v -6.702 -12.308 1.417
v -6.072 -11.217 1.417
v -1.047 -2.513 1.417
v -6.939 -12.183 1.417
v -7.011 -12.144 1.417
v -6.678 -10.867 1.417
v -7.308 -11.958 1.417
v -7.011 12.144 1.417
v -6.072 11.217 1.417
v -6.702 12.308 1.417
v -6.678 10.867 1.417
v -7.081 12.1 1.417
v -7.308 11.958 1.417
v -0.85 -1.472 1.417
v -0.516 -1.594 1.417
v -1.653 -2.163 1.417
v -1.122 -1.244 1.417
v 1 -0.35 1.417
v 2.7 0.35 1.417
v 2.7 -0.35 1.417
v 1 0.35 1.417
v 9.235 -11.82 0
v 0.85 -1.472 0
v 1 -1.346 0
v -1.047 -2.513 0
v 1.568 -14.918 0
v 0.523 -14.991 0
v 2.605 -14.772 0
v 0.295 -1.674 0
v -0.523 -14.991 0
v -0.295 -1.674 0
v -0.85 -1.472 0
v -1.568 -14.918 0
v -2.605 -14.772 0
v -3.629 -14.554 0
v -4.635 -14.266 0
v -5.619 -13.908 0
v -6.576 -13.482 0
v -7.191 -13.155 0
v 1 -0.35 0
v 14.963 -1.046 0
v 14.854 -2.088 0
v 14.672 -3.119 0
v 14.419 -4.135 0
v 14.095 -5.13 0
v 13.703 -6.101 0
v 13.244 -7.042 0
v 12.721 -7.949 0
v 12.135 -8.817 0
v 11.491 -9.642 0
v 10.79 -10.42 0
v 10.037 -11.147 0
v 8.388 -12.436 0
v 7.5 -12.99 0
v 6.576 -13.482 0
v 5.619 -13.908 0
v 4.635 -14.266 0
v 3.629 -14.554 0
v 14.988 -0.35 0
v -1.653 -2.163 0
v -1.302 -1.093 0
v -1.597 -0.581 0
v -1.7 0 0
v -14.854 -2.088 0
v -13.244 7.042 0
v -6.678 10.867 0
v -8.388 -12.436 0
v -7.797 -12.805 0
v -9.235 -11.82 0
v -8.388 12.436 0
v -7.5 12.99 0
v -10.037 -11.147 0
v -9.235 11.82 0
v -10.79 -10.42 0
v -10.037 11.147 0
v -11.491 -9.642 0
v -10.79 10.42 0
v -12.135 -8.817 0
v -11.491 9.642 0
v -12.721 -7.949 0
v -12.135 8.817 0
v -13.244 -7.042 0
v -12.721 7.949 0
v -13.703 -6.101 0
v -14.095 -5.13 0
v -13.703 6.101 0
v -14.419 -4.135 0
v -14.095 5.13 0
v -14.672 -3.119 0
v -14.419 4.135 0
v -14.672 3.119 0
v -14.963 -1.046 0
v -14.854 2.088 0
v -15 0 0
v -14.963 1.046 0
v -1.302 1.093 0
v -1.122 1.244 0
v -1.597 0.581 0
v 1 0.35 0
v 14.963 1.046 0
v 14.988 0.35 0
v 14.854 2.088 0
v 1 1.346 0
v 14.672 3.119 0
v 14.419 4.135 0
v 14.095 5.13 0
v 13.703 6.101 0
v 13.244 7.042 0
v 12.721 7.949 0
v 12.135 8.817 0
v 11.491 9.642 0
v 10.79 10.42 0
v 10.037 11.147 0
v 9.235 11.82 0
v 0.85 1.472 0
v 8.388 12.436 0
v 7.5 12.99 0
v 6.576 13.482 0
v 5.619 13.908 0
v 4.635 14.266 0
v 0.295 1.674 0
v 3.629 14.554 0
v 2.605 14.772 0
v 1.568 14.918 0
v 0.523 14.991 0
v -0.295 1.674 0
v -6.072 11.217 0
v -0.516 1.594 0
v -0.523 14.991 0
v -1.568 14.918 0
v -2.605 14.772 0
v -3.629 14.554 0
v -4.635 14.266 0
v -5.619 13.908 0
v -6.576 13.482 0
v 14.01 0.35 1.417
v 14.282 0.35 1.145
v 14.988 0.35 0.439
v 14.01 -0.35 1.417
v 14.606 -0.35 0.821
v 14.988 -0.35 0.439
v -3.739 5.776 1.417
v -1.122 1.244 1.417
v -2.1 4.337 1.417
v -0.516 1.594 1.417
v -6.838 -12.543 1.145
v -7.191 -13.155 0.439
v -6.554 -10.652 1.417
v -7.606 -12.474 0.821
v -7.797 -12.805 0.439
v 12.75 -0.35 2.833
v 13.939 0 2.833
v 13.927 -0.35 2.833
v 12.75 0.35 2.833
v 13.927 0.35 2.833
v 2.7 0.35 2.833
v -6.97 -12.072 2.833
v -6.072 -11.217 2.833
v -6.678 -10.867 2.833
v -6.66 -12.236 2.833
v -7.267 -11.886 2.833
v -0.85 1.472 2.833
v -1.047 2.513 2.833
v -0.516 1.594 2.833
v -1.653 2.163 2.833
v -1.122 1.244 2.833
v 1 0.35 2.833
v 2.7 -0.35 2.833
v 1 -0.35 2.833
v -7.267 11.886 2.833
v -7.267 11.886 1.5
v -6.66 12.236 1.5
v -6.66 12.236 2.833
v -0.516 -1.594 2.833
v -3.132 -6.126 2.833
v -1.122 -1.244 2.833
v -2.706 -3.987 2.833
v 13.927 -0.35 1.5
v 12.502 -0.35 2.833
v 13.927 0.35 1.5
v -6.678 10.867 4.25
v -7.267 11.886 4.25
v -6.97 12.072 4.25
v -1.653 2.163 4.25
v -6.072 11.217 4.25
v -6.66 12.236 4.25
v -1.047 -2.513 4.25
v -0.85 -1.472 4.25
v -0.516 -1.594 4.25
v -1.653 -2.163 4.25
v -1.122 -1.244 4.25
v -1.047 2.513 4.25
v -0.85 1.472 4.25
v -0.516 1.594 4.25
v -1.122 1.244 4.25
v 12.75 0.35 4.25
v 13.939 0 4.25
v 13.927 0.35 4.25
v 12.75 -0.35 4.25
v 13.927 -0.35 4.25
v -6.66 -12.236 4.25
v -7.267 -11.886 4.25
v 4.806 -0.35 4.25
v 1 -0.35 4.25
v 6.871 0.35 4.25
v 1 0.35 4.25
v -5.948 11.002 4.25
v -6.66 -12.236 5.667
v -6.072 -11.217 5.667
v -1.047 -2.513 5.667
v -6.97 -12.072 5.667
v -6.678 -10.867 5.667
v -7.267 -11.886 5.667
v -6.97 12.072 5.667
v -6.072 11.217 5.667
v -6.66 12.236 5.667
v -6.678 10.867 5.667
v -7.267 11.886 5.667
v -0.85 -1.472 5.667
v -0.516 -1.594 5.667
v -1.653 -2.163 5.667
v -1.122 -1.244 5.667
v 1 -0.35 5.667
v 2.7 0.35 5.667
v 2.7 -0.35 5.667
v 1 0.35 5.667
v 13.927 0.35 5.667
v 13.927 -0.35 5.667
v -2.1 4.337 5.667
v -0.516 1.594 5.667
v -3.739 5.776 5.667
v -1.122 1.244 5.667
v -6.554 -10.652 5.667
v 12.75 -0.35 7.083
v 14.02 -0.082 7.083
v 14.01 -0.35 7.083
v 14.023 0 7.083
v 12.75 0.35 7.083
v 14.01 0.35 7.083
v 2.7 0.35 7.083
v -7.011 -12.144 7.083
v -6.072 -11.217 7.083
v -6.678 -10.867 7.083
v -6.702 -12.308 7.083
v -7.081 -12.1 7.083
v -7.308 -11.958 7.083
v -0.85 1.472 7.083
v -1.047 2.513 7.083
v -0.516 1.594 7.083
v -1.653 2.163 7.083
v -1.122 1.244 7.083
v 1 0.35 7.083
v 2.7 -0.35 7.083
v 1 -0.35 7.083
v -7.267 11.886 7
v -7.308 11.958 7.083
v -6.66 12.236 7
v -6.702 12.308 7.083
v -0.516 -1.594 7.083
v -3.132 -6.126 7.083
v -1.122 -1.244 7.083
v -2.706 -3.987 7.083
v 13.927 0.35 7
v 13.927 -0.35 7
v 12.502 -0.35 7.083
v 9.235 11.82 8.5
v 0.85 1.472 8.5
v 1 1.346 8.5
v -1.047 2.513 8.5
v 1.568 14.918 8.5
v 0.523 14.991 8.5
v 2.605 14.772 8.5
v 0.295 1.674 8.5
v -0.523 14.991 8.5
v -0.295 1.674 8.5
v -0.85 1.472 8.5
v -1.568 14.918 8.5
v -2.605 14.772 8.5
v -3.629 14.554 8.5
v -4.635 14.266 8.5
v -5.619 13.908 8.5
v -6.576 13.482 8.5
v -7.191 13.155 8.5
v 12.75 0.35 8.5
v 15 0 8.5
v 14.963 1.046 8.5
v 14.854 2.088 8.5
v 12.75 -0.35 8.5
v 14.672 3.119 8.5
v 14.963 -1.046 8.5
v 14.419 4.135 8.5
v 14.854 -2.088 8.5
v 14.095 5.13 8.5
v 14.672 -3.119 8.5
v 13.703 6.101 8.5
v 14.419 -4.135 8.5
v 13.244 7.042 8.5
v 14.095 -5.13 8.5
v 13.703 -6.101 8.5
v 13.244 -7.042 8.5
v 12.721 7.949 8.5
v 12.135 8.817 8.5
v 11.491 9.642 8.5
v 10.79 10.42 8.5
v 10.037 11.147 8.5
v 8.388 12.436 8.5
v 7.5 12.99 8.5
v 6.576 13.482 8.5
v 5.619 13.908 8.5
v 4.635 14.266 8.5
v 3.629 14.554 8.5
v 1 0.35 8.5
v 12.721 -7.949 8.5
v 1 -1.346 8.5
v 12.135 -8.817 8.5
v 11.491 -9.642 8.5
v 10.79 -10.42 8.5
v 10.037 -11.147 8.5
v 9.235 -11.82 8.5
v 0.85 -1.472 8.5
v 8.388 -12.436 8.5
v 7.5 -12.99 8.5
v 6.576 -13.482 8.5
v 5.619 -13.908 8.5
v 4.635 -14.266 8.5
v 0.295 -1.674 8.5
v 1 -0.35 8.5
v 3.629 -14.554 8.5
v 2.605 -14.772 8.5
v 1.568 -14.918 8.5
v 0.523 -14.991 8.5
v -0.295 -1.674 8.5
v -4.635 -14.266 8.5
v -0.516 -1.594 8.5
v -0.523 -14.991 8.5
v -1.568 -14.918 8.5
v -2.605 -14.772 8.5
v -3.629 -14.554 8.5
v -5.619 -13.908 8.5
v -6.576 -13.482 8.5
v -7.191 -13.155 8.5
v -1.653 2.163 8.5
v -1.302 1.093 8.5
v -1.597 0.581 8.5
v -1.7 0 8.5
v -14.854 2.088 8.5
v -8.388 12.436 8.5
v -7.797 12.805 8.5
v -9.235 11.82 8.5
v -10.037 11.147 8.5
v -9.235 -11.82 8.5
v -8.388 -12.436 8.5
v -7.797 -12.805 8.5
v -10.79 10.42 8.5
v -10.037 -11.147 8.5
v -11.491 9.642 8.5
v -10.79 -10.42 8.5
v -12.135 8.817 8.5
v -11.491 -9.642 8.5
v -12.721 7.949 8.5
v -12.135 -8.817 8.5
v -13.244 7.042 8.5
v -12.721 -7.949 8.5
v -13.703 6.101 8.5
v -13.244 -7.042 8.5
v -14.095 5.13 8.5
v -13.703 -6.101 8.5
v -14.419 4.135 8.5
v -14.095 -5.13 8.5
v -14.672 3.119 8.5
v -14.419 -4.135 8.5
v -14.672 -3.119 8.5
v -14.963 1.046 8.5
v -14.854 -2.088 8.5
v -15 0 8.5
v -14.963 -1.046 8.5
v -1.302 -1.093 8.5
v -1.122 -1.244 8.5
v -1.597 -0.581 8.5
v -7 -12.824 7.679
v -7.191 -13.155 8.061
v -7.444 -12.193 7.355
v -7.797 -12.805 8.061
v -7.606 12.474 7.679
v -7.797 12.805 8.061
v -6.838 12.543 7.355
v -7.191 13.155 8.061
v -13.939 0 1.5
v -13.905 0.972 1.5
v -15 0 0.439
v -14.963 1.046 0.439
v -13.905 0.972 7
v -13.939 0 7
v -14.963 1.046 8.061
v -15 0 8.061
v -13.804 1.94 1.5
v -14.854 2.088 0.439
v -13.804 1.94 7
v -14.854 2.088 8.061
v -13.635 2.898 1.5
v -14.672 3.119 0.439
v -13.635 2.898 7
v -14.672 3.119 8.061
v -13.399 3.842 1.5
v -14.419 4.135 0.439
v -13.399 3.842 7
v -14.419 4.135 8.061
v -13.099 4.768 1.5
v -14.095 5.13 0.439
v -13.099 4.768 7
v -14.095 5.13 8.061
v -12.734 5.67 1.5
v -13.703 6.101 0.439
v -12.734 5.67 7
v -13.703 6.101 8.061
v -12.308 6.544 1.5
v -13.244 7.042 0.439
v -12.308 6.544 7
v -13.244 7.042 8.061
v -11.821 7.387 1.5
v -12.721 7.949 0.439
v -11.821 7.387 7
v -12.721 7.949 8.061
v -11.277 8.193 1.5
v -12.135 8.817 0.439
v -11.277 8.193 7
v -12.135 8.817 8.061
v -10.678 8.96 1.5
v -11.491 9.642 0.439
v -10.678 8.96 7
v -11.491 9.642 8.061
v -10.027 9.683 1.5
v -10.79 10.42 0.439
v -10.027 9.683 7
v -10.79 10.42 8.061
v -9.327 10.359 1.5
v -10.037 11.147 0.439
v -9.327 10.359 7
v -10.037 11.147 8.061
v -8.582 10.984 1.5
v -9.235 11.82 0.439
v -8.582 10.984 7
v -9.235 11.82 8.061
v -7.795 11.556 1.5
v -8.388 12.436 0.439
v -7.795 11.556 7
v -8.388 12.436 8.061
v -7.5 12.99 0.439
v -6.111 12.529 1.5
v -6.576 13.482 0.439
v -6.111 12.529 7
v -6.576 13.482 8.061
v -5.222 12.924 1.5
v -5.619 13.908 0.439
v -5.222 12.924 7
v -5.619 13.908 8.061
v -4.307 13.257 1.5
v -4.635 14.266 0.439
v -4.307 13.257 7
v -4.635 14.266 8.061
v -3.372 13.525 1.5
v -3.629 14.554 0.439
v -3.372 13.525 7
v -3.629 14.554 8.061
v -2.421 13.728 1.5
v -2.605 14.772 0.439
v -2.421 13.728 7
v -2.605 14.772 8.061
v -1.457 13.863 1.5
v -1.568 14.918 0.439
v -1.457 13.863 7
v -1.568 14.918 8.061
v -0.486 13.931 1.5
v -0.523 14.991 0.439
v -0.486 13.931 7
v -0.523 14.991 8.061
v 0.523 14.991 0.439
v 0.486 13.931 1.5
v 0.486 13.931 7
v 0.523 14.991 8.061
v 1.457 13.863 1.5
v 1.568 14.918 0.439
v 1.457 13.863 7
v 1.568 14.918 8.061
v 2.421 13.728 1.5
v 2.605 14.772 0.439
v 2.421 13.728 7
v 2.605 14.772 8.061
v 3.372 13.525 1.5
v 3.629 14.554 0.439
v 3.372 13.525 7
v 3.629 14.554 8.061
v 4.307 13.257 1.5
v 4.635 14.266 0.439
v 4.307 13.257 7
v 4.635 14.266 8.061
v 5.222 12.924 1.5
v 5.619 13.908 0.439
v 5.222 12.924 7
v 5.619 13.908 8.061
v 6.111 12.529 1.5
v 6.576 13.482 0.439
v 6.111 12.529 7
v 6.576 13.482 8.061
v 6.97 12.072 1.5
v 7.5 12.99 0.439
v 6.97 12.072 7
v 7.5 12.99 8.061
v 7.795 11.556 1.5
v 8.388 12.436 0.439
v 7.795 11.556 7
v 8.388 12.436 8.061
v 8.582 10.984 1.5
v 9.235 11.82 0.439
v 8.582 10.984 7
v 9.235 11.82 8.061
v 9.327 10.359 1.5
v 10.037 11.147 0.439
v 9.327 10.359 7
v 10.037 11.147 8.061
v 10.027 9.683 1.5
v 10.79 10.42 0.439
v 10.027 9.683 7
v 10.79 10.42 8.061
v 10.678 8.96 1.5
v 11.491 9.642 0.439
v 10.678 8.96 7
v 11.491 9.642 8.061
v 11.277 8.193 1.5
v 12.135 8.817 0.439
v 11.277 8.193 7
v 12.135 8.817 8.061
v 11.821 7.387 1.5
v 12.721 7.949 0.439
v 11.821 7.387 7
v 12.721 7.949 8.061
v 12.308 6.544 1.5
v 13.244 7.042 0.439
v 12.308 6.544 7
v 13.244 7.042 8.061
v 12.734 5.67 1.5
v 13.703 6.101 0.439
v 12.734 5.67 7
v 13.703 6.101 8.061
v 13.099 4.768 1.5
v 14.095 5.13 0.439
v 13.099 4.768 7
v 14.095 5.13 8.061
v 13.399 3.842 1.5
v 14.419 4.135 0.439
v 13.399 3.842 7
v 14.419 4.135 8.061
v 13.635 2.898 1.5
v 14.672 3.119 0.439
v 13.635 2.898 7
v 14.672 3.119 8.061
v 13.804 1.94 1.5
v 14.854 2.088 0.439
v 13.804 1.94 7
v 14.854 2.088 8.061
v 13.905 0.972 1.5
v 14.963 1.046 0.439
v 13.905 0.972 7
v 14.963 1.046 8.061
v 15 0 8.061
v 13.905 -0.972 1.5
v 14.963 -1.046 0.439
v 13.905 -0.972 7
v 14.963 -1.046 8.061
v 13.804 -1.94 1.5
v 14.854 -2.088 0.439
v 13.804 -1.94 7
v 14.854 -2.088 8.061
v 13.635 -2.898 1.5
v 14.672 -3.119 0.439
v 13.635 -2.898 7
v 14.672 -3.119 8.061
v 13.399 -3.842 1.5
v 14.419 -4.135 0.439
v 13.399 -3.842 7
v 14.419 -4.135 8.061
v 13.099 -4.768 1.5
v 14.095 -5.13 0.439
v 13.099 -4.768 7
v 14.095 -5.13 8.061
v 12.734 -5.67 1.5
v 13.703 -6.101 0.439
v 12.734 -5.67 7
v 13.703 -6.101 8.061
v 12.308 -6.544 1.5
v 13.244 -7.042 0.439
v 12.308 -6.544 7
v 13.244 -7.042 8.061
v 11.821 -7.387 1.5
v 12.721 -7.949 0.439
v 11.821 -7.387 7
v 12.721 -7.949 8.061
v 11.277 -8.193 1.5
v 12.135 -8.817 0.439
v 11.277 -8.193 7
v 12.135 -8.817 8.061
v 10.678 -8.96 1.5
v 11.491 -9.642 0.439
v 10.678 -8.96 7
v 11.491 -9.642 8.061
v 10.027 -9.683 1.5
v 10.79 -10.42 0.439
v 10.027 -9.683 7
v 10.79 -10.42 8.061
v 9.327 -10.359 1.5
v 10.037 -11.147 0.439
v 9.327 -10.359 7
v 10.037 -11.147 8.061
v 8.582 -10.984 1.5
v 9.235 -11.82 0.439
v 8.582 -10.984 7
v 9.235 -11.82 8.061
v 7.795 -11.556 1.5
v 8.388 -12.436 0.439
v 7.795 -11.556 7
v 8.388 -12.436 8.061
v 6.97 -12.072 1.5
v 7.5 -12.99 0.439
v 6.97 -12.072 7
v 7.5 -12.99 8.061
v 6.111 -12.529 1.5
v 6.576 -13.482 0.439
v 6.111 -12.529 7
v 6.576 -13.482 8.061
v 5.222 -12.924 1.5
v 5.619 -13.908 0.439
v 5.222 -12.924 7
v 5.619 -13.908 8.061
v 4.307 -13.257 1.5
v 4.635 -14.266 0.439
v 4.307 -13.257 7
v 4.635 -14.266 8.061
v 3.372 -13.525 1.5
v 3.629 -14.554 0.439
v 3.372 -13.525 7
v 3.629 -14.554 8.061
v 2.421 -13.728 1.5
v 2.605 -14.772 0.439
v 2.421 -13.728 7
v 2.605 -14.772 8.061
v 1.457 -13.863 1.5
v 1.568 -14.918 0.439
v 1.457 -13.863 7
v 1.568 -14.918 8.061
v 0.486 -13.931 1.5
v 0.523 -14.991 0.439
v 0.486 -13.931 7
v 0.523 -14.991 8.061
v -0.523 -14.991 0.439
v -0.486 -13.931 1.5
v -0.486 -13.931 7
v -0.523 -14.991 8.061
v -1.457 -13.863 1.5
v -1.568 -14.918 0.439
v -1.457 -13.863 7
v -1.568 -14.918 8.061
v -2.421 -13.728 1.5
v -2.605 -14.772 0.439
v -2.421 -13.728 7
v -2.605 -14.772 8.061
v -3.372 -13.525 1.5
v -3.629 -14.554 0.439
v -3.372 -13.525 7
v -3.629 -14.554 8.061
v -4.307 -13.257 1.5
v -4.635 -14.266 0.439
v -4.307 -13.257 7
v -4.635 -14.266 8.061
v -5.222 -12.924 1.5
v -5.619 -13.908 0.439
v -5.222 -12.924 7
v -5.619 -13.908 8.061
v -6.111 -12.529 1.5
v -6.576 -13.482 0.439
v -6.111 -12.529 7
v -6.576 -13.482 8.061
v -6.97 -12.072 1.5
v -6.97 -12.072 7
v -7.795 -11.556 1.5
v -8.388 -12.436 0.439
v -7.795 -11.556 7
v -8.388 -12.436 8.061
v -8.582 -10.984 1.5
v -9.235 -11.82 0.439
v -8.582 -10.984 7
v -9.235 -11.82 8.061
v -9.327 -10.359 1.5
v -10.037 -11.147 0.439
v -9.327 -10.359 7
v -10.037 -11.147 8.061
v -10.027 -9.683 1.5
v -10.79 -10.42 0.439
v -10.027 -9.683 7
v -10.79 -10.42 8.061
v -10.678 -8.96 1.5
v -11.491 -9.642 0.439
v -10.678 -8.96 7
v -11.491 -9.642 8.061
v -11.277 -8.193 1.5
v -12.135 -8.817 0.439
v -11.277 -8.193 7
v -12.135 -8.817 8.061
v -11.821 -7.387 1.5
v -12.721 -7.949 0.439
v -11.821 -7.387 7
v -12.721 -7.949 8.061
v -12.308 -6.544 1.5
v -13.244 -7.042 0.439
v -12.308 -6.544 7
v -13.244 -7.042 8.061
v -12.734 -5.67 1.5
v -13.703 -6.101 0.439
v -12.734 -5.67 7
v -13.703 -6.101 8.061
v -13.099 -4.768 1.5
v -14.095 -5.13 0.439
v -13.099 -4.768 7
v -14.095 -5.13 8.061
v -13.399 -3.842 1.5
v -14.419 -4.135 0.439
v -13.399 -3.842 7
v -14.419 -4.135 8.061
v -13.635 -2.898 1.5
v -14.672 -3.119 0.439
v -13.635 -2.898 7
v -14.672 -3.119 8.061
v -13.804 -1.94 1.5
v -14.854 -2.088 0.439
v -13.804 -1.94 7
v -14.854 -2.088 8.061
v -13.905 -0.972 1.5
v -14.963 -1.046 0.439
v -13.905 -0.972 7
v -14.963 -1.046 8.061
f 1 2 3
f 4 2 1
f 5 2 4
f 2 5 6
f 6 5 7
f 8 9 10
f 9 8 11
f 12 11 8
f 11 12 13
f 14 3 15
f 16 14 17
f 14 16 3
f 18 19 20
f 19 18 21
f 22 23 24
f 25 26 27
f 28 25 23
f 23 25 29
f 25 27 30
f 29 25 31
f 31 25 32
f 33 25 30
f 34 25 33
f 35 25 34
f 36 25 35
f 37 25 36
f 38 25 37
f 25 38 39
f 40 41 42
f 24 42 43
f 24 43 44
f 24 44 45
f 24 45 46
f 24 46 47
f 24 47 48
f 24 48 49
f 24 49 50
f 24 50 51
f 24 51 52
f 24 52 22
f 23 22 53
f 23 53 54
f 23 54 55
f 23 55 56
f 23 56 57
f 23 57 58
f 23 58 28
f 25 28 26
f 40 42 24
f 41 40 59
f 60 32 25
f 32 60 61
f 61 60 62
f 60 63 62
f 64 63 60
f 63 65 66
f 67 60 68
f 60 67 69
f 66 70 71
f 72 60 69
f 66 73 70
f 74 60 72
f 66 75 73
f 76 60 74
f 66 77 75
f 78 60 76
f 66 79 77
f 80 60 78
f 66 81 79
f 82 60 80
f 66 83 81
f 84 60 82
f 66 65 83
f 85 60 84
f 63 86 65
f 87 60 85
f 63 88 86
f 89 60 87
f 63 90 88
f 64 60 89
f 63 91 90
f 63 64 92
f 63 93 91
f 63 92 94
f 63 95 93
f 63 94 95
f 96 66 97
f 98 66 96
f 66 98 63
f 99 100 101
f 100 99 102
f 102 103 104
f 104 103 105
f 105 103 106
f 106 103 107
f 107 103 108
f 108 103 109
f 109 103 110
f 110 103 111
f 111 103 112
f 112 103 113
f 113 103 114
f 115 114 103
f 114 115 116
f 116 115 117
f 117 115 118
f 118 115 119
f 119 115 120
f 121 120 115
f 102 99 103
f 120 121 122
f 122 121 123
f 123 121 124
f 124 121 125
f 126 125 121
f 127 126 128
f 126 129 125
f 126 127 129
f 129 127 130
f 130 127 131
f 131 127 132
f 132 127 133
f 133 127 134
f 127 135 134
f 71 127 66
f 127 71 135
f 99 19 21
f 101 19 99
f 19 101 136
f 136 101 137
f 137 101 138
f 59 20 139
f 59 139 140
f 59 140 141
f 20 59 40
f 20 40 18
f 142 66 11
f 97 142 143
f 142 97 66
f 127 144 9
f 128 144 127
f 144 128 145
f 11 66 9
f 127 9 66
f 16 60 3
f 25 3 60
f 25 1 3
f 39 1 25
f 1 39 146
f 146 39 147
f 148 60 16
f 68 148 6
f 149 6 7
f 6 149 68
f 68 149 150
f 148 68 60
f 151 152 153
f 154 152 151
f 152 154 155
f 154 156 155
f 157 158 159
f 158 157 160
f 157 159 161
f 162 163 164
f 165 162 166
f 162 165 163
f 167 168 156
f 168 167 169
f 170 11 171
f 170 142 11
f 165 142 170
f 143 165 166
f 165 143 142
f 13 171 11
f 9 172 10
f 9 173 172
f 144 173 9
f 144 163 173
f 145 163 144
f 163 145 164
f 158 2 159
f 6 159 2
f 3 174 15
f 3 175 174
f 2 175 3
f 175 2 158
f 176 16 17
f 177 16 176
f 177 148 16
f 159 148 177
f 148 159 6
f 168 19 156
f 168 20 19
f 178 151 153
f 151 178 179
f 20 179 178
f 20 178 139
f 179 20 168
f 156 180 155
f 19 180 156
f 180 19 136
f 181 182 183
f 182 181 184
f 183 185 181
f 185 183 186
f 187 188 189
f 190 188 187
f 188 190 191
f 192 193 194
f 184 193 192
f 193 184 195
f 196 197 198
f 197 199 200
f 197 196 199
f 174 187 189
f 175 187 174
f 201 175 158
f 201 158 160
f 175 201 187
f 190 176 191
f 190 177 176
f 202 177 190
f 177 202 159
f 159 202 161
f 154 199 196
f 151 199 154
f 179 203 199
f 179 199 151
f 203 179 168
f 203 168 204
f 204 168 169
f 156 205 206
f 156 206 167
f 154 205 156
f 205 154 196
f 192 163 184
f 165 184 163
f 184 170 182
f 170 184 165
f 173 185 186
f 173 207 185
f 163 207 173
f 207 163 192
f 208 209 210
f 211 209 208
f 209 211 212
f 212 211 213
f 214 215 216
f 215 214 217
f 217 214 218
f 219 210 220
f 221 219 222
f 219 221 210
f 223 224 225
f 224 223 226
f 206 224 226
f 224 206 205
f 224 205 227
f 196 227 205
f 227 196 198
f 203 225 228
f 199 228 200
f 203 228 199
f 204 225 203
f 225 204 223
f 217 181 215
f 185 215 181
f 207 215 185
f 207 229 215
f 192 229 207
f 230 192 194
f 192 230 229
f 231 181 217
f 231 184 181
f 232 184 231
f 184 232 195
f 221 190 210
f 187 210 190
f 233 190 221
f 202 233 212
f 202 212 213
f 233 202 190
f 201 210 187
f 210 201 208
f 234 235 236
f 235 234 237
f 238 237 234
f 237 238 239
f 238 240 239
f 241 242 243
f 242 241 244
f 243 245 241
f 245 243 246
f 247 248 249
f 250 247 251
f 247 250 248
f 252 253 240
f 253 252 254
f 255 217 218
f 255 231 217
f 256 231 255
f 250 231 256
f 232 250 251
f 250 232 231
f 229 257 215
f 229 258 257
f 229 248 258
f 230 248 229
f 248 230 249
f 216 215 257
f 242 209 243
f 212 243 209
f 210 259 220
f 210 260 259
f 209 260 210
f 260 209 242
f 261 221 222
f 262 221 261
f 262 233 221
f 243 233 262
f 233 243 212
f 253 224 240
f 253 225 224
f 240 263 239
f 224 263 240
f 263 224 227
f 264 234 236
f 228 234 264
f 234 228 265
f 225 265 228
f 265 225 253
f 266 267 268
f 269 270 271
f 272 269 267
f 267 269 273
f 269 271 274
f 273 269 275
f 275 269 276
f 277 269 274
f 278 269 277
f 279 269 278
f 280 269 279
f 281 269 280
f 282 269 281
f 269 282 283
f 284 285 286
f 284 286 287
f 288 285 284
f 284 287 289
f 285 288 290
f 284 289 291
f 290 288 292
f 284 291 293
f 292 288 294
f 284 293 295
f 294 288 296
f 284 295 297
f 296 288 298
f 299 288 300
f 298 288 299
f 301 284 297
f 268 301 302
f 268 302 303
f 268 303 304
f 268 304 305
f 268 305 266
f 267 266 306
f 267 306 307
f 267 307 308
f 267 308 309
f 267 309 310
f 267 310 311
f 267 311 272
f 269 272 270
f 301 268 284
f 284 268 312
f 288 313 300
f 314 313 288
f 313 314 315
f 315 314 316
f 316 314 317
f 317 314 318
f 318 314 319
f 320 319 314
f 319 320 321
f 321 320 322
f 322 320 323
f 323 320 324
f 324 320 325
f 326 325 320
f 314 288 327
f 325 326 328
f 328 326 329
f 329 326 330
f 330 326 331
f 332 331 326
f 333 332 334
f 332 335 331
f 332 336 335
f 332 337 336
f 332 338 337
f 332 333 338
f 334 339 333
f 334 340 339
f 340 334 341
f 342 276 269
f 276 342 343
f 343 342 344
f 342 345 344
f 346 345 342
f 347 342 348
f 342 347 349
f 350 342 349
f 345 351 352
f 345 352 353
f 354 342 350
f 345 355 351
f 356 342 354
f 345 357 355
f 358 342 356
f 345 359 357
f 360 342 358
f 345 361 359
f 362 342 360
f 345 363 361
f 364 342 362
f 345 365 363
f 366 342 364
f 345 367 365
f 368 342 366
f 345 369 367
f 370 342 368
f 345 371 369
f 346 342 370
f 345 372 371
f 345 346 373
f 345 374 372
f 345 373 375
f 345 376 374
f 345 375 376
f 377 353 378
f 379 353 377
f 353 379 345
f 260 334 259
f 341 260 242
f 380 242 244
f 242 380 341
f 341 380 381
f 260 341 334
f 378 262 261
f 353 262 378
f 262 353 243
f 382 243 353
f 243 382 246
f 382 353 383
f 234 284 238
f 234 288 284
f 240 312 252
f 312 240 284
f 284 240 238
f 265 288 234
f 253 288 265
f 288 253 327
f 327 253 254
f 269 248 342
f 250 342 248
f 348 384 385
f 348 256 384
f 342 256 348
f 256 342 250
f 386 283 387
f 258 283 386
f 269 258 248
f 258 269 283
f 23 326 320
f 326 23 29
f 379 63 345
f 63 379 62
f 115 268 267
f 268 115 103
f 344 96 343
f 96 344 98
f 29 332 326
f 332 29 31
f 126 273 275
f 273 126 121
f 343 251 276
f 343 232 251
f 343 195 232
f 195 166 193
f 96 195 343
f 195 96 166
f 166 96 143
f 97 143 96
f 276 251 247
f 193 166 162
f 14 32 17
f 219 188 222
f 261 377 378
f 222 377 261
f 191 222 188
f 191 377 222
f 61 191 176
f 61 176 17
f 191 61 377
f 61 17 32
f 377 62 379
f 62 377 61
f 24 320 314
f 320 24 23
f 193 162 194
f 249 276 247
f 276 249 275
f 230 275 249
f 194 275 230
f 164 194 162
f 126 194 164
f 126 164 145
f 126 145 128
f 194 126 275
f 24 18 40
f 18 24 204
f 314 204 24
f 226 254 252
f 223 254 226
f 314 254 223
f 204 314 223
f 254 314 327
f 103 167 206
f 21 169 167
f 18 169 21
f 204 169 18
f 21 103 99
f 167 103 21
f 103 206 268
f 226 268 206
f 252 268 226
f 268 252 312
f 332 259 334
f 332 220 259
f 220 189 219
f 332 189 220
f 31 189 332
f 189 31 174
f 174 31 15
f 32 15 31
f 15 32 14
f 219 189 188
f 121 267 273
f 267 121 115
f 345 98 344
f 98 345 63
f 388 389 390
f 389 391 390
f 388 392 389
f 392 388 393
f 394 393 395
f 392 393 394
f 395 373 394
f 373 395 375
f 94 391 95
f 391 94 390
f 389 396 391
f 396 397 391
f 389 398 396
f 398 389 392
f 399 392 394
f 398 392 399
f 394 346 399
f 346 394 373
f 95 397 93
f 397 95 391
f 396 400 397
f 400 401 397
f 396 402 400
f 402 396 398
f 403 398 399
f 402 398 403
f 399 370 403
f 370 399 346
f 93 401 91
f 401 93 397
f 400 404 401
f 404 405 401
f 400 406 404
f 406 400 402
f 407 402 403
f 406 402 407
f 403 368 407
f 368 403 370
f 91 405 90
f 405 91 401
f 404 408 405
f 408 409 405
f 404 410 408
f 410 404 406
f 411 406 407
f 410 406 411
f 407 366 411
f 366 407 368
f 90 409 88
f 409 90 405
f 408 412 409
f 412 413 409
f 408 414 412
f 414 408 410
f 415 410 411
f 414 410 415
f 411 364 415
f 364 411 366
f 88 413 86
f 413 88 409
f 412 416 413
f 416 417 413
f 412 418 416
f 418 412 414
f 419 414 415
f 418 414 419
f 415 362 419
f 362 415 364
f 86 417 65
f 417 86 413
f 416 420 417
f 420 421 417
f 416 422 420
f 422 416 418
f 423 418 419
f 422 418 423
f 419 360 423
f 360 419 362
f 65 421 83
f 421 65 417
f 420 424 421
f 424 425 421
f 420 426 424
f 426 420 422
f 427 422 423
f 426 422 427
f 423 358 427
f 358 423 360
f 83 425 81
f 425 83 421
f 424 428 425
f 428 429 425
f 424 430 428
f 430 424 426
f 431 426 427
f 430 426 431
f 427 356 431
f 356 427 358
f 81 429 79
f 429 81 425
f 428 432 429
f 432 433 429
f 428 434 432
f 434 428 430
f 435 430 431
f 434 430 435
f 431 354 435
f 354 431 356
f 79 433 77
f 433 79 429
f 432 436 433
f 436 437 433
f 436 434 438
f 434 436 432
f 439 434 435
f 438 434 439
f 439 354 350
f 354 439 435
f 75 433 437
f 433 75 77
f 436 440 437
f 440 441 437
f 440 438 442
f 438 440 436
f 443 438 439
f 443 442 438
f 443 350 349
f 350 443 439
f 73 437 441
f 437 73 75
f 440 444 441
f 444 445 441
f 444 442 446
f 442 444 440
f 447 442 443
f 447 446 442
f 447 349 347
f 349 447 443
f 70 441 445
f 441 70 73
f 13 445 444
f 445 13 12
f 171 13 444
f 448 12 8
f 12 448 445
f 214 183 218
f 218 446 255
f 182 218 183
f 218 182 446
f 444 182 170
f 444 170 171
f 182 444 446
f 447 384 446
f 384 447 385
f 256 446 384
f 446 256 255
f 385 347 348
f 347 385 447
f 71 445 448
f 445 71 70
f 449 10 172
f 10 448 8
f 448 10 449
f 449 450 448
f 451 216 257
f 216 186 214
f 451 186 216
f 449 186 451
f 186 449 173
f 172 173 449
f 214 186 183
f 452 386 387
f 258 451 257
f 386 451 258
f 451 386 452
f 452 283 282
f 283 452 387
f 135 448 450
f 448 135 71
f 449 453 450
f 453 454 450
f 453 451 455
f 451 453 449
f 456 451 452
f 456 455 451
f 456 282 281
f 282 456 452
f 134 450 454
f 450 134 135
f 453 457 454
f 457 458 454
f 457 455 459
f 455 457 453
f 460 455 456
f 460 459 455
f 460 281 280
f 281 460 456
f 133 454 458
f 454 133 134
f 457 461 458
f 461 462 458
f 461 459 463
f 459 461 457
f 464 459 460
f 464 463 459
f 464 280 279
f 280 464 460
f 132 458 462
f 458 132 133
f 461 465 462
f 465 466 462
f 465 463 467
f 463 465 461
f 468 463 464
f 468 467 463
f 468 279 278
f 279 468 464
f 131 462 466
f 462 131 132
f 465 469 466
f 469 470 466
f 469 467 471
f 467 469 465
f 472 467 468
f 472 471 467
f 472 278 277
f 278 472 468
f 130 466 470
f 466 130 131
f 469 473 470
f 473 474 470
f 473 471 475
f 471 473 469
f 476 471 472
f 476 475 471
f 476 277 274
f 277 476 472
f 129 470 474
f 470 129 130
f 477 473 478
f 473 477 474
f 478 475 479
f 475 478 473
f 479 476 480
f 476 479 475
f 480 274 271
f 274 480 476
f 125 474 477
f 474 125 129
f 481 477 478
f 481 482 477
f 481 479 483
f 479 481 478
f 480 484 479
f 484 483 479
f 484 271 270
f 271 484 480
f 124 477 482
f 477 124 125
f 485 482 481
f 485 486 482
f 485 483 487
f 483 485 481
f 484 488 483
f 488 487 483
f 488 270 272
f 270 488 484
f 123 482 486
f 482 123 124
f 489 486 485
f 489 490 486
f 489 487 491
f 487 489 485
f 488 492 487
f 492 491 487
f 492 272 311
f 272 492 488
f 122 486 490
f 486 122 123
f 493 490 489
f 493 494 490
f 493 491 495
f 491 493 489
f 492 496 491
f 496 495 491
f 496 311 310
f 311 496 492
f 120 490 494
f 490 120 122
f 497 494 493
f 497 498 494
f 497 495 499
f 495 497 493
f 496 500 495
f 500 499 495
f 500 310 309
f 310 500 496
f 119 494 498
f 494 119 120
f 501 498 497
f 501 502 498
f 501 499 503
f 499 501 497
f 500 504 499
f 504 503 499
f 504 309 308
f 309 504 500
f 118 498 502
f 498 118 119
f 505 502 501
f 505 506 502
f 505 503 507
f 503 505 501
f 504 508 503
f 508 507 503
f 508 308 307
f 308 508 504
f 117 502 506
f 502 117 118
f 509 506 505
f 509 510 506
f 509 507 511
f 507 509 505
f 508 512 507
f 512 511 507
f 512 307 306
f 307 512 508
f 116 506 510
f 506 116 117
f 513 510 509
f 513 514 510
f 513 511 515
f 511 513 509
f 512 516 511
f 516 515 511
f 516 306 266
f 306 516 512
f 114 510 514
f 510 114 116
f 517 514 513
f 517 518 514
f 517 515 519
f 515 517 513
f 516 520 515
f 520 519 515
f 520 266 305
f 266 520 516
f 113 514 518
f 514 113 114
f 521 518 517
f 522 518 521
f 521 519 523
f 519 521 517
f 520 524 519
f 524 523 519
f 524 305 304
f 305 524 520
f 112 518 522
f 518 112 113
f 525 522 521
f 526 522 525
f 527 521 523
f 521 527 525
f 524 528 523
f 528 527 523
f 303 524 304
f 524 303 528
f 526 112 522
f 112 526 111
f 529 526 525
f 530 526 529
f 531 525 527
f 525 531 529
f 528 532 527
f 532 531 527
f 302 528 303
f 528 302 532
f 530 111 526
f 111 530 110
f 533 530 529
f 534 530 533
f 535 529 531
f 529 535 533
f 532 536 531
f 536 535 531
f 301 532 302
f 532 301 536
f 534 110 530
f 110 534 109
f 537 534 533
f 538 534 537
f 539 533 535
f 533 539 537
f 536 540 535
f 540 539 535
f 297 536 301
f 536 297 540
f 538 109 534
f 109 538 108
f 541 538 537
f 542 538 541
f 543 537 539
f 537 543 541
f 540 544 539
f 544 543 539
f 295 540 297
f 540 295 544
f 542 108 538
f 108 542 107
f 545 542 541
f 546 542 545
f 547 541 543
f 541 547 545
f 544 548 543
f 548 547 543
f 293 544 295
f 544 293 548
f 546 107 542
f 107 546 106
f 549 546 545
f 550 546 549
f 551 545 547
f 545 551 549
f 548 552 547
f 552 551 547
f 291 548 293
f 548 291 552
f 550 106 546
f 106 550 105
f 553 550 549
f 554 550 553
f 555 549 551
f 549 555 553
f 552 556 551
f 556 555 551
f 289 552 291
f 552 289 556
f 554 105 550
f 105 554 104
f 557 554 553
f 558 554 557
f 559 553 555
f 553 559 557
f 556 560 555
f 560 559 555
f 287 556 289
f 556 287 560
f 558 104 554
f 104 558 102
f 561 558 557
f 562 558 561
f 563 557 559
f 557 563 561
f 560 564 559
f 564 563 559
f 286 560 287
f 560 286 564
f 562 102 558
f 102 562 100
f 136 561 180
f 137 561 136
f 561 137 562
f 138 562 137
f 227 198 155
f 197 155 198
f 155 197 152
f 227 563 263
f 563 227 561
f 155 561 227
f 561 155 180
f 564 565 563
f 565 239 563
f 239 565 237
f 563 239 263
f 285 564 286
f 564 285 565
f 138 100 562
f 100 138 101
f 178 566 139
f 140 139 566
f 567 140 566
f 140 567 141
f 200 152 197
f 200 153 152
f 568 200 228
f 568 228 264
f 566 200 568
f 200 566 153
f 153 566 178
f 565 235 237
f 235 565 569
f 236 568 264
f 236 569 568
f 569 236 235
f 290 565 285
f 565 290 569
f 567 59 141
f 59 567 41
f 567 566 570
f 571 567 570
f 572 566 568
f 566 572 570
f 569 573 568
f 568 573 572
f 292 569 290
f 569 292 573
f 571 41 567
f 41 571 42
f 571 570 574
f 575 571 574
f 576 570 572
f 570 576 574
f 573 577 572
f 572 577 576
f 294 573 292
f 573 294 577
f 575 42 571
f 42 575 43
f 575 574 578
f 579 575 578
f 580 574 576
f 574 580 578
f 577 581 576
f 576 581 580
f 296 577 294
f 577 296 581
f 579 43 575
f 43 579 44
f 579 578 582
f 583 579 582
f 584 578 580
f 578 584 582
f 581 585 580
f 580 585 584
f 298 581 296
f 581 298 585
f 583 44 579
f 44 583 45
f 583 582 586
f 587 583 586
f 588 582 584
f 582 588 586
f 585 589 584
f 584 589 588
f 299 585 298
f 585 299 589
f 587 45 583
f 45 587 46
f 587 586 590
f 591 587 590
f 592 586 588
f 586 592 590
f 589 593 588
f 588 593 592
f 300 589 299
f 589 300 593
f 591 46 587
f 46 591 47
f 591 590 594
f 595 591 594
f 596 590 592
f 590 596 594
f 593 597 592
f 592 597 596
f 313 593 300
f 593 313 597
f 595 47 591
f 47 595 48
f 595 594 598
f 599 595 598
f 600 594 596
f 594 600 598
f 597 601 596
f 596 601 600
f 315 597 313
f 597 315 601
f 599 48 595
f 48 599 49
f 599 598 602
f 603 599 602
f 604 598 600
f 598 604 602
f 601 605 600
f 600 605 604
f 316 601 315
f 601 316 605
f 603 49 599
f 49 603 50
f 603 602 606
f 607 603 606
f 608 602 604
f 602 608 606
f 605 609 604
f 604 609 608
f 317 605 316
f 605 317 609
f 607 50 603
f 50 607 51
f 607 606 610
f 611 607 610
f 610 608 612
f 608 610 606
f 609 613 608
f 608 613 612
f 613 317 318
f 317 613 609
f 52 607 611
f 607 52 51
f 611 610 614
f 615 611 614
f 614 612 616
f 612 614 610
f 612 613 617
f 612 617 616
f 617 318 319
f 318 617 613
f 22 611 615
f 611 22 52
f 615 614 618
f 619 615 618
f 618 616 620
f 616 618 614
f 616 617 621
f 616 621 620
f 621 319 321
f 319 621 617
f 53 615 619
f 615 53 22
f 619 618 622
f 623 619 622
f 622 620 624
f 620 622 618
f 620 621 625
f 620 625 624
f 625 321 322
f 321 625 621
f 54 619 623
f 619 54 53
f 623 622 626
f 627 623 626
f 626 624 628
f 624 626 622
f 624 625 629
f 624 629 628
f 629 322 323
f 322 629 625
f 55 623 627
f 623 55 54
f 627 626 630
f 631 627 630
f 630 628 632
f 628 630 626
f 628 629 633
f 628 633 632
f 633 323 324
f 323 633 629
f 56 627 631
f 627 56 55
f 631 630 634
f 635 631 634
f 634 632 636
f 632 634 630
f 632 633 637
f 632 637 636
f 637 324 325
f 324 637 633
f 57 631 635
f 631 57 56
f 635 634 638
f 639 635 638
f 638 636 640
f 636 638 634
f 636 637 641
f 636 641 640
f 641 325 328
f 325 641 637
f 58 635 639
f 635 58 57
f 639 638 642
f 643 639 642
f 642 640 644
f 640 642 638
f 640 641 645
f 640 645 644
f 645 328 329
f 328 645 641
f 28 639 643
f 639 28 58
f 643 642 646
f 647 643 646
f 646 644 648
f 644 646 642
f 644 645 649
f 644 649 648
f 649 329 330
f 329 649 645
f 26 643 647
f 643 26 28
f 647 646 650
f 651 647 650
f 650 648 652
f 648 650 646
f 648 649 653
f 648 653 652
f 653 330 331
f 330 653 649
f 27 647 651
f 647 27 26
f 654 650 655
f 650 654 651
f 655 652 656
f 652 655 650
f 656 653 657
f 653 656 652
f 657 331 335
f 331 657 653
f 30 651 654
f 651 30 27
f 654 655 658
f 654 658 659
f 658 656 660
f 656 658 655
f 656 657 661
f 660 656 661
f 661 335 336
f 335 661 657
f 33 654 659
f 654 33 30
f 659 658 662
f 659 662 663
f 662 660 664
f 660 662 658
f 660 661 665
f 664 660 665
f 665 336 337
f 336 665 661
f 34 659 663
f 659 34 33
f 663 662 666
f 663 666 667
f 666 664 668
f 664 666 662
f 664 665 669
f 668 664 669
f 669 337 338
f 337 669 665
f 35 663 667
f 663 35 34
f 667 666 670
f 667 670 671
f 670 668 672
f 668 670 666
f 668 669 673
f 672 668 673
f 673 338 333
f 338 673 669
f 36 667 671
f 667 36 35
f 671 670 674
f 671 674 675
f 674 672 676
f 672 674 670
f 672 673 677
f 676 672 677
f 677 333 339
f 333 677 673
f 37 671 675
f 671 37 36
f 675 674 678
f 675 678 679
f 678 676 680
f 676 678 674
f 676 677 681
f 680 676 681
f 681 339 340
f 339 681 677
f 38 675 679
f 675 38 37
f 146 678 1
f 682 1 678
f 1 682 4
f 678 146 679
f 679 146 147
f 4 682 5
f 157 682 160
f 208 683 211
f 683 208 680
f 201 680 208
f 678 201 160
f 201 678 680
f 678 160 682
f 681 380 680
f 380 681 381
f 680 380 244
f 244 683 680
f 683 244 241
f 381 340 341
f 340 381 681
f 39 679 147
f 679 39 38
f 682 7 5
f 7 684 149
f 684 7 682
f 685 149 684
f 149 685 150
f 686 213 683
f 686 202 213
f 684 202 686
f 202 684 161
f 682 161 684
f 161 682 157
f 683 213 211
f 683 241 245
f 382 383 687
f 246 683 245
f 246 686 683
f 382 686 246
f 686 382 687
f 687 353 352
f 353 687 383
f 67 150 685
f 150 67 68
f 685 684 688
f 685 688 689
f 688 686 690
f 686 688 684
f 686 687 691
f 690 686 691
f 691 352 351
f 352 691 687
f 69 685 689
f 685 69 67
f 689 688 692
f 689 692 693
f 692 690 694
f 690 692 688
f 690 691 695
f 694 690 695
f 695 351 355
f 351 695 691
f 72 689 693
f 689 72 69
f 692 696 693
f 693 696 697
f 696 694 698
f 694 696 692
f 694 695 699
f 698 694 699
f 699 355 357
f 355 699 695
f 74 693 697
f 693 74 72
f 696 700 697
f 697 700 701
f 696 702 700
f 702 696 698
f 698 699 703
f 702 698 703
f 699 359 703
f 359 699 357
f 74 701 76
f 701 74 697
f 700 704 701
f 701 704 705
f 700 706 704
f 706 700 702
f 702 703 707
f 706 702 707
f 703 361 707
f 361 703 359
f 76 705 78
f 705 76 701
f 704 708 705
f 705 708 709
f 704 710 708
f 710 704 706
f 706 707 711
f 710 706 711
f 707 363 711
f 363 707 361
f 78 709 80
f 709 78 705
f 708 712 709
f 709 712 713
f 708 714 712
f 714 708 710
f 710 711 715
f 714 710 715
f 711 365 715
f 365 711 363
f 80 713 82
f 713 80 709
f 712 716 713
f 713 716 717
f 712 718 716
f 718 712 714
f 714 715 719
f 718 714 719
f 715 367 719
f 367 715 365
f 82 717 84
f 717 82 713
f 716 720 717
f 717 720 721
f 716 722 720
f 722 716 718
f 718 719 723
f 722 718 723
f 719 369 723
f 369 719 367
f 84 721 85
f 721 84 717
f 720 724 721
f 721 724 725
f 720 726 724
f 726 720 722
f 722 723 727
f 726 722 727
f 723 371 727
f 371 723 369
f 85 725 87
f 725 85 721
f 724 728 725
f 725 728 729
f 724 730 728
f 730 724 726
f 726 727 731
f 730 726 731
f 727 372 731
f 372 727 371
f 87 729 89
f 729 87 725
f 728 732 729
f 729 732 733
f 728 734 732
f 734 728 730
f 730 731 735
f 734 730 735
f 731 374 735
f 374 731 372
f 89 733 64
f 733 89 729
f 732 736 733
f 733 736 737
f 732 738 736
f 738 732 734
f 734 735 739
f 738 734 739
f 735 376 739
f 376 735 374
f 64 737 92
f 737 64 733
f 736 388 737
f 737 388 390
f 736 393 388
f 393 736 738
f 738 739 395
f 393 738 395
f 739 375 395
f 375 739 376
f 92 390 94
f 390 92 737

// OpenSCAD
// file: inc/bevel_lib.scad
// Bevelled boxes, etc
module roundedbox(size=[1.0, 1.0, 1.0, ], radius = 0.1) {
    hull() {
        for (x = [radius, size[0] - radius]) {
            for (y = [radius, size[1] - radius]) {
                for (z = [radius, size[2] - radius]) {
                    translate([x,y,z])
                        sphere(r=radius);
                }
            }
        }
    }
}

module rounded_square_centered(size=[1,1], radius=0.1) {
    hull() {
        for (x = [- size[0] / 2 + radius, size[0] / 2 - radius]) {
            for (y = [- size[1] / 2 + radius, size[1] / 2 - radius]) {
                translate([x,y]) circle(radius);
            }
        }
    }
}

// Bevelled in x and y axes.
module bevelledbox(size=[1,1,1], radius=0.1) {
    linear_extrude(height=size[2]) {
        // 8-sided polygon
        polygon(points=[
            // Left
            [0, radius ],
            [0, size[1] - radius ],
            // Top
            [radius, size[1]],
            [size[0] - radius, size[1]],
            // Right
            [size[0], size[1] - radius],
            [size[0], radius],
            // Bot
            [size[0] -radius, 0],
            [radius, 0]
            ]);
    }
}

module bevelledbox_y(size=[1,1,1], radius=0.1) {
    // Bevelled around y
    translate([0,0,size[2]])
        rotate(-90, [1,0,0])
            bevelledbox([size[0], size[2], size[1]], radius); 
}

module bevelledbox_x(size=[1,1,1], radius=0.1) {
    // Bevelled around x
    translate([size[0],0,0])
        rotate(-90, [0,1,0])
            bevelledbox([size[2], size[1], size[0]], radius); 
}

// Draw origin-centred, unit polyhedron.
module octahedron(C0=1.0) {
    polyhedron(points = [
        [0.0, 0.0,  C0],
        [0.0, 0.0, -C0],
        [ C0, 0.0, 0.0],
        [-C0, 0.0, 0.0],
        [0.0,  C0, 0.0],
        [0.0, -C0, 0.0]
        ],
        faces = [
[ 4 , 2, 0],
[ 3 , 4, 0],
[ 5 , 3, 0],
[ 2 , 5, 0],
[ 5 , 2, 1],
[ 3 , 5, 1],
[ 4 , 3, 1],
[ 2 , 4, 1]
        ]
    );
}

module fullybevelledbox(size=[1,1,1], radius=0.1) {
    hull() {
        for (x = [radius, size[0] - radius]) {
            for (y = [radius, size[1] - radius]) {
                for (z = [radius, size[2] - radius]) {
                    translate([x,y,z])
                        octahedron(radius);
                }
            }
        }
    }
}
// main file
// This document uses MILLIMETRES as a unit.

// Set $fs (smallest arc fragment) to lower value than default 2.0
$fs = 0.6; // millimetres
$fa = 4;
use <inc/bevel_lib.scad>;

// Gearbox is approx 15x10 mm, so needs about 18mm inside
main_diameter = 30;

main_radius = main_diameter / 2;

axle_diameter = 3.0;
axle_radius = axle_diameter / 2;
axle_radius_margin = 0.2; // Extra allowance for shrinkage etc
main_height = 8.5;
tyre_radius = 1.5;
tyre_offset = 2.5; // tyre distance from end

// Unit-diamond 
module diamond(r=1.0)
{
    polygon(points=[ [r,0], [0,r], [-r,0], [0,-r] ]);
}

module bevel_square(size=[10,10], r=1.0)
{
    hull() {
        translate([r,r]) diamond(r);
        translate(size - [r,r]) diamond(r);
        translate([size[0] - r, r]) diamond(r);
        translate([r, size[1] - r]) diamond(r);
    }
}

module wheel_vase() 
{
    difference()
    {
        union()
        {
            // Outer part
            rotate_extrude(convexity=3) {
                difference() {
                    
                    union() {
                        // Walls
                            square([main_radius, main_height]);
                    };
                    // Tyre cutout
                    translate([main_radius - (tyre_radius / sqrt(2)),0])
                    {
                        bevel_square([tyre_radius * 2, main_height],
                            r=tyre_radius);
                    }
                }
            }
        }
        
        // Cutouts
        union() 
        {
            // Cutout for axle
            translate([0,0,-10]) {
                linear_extrude(height=30.0, convexity=3) {
                    intersection() {
                        circle(r=axle_radius + axle_radius_margin);
                        flat_width = 0.7; // flat side width
                        translate([- flat_width,0,0]) {
                            side = (axle_radius + axle_radius_margin) * 2;
                            square([side, side], center=true);
                        }
                    }
                } // linear
            } // trans
            // Now we need to cut outs for spokes. These are special;
            // Each layer has three spokes, but only one of them reaches
            // the outer part.
            // This is so that on each layer, we have a continuous loop
            // with no jumps 
            spoke_cut_width = 0.7;
            for (i = [0,1,2,3,4,5]) {
                // One spoke goes *all the way*
                // One spoke nearly reaches the outside
                // One spoke nearly reaches the inside.
                rotate([0,0,i*120])  {
                    // Full spoke
                    spoke_full_len = main_radius + 10;
                    translate([0,-0.5 * spoke_cut_width,i * main_height / 6])
                        cube([spoke_full_len, spoke_cut_width, (main_height / 6) ]);
                    // Partial spoke which does not reach the outer circle
                    spoke_len_partial = main_radius - tyre_radius - 0.75;
                    rotate([0,0,120]) 
                        translate([0,-0.5 * spoke_cut_width,i * main_height / 6])
                            cube([spoke_len_partial, spoke_cut_width, (main_height / 6) ]);
                    // Partial spoke which does not reach the inner circle.
                    spoke_inner_offset = axle_radius + axle_radius_margin + 1.0;
                    rotate([0,0,240]) 
                        translate([spoke_inner_offset,-0.5 * spoke_cut_width,i * main_height / 6])
                            cube([spoke_full_len, spoke_cut_width, (main_height / 6) ]);
                    
                    
                }                
            }
        } // union
    } // difference
}

wheel_vase();
